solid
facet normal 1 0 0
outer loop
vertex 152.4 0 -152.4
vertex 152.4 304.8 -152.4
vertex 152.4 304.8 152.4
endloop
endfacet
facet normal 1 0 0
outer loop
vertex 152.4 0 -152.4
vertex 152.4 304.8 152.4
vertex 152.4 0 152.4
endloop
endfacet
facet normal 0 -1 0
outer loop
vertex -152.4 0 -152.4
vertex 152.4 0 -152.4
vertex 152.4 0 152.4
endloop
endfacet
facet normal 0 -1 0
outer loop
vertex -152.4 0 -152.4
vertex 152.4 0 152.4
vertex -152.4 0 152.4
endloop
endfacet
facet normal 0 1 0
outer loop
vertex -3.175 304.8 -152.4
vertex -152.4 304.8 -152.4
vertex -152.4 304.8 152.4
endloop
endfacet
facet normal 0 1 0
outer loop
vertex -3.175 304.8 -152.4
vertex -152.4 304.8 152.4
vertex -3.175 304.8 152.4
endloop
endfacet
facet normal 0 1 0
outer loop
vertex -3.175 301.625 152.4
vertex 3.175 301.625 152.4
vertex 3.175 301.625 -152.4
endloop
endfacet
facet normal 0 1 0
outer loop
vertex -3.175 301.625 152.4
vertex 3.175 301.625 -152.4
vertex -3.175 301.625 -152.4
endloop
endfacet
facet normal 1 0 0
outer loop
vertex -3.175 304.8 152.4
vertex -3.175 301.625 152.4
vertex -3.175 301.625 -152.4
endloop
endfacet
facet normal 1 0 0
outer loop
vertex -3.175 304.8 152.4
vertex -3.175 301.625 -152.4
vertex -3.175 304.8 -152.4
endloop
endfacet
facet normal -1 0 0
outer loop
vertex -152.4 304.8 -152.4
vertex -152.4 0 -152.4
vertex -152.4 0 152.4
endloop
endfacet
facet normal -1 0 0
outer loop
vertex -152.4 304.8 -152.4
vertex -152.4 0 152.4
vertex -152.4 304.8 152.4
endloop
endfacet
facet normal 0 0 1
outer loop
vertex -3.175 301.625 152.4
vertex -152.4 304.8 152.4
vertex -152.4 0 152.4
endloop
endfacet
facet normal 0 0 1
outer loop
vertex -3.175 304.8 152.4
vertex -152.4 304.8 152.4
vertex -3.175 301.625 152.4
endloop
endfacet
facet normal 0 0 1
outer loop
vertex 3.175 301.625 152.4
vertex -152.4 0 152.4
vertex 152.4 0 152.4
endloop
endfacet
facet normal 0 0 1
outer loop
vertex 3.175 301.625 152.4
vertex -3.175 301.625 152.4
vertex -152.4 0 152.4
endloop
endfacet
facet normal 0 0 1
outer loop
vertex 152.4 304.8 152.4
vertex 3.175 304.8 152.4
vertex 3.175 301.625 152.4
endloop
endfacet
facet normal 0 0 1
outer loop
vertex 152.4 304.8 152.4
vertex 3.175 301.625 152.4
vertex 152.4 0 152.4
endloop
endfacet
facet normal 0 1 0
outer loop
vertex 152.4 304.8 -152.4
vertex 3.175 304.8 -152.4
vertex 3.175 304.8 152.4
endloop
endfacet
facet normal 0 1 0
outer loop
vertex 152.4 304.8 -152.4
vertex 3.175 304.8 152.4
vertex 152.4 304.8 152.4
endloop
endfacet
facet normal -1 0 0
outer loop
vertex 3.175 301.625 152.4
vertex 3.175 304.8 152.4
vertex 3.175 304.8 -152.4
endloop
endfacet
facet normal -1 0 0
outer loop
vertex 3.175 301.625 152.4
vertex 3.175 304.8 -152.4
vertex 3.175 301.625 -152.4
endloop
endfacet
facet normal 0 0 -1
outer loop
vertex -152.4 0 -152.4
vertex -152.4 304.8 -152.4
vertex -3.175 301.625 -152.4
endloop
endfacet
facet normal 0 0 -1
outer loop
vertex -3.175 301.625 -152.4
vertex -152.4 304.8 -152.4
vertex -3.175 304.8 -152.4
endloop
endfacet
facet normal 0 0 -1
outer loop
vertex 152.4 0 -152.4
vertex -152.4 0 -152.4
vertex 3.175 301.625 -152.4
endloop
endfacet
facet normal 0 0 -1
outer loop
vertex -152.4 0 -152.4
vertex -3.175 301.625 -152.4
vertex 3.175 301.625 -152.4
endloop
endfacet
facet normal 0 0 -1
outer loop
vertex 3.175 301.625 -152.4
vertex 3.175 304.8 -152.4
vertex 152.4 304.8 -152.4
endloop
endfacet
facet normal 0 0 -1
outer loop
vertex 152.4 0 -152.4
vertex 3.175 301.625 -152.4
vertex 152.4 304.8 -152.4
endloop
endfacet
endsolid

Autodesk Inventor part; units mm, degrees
ref_plane "YZ Plane" through (0, 0, 0) normal (1, 0, 0) x (0, 1, 0)
ref_plane "XZ Plane" through (0, 0, 0) normal (0, 1, 0) x (-1, 0, 0)
ref_plane "XY Plane" through (0, 0, 0) normal (0, 0, 1) x (1, 0, 0)
sketch "Sketch1" plane through (0, 0, 0) normal (0, 0, 1) x (1, 0, 0)
  line L0 (-152.4, 304.8) -> (152.4, 304.8)
  line L1 (152.4, 304.8) -> (152.4, 0)
  line L2 (152.4, 0) -> (-152.4, 0)
  line L3 (-152.4, 0) -> (-152.4, 304.8)
  point P0 (0, 0)
  point P1 (0, 0)
extrude "Extrusion1" add sketch "Sketch1" along normal mid plane 304.8
sketch "Sketch2" plane through (0, 0, 152.4) normal (0, 0, 1) x (1, 0, 0)
  line L0 (-152.4, 304.8) -> (152.4, 304.8) projected
  line L1 (-3.175, 304.8) -> (3.175, 304.8)
  line L2 (3.175, 304.8) -> (3.175, 301.625)
  line L3 (3.175, 301.625) -> (-3.175, 301.625)
  line L4 (-3.175, 301.625) -> (-3.175, 304.8)
  point P0 (0, 0)
  point P1 (0, 304.8)
  dimension "d4" = 3.175
  dimension "d5" = 6.35
extrude "Extrusion2" cut sketch "Sketch2" against normal through all
sketch "Sketch3" plane through (0, 0, 152.4) normal (0, 0, 1) x (1, 0, 0)
  line L0 (-152.4, 0) -> (-152.4, 304.8) projected
  line L1 (152.4, 0) -> (-152.4, 0) projected
  line L2 (-127, 25.4) -> (-50.8, 25.4)
  line L3 (-50.8, 25.4) -> (-50.8, 101.6)
  line L4 (-50.8, 101.6) -> (-127, 101.6)
  line L5 (-127, 101.6) -> (-127, 25.4)
  line L6 (-123.825, 98.425) -> (-53.975, 98.425)
  line L7 (-53.975, 98.425) -> (-53.975, 28.575)
  line L8 (-53.975, 28.575) -> (-123.825, 28.575)
  line L9 (-123.825, 28.575) -> (-123.825, 98.425)
  line L10 (-38.1, 25.4) -> (38.1, 25.4)
  line L11 (38.1, 25.4) -> (38.1, 101.6)
  line L12 (38.1, 101.6) -> (-38.1, 101.6)
  line L13 (-38.1, 101.6) -> (-38.1, 25.4)
  line L14 (-34.925, 98.425) -> (34.925, 98.425)
  line L15 (34.925, 98.425) -> (34.925, 28.575)
  line L16 (34.925, 28.575) -> (-34.925, 28.575)
  line L17 (-34.925, 28.575) -> (-34.925, 98.425)
  line L18 (-127, 114.3) -> (-50.8, 114.3)
  line L19 (-50.8, 114.3) -> (-50.8, 190.5)
  line L20 (-50.8, 190.5) -> (-127, 190.5)
  line L21 (-127, 190.5) -> (-127, 114.3)
  line L22 (-123.825, 187.325) -> (-53.975, 187.325)
  line L23 (-53.975, 187.325) -> (-53.975, 117.475)
  line L24 (-53.975, 117.475) -> (-123.825, 117.475)
  line L25 (-123.825, 117.475) -> (-123.825, 187.325)
  line L26 (-38.1, 114.3) -> (38.1, 114.3)
  line L27 (38.1, 114.3) -> (38.1, 190.5)
  line L28 (38.1, 190.5) -> (-38.1, 190.5)
  line L29 (-38.1, 190.5) -> (-38.1, 114.3)
  line L30 (-34.925, 187.325) -> (34.925, 187.325)
  line L31 (34.925, 187.325) -> (34.925, 117.475)
  line L32 (34.925, 117.475) -> (-34.925, 117.475)
  line L33 (-34.925, 117.475) -> (-34.925, 187.325)
  point P0 (0, 0)
  dimension "d8" = 76.2
  dimension "d9" = 25.4
  dimension "d10" = 25.4
  dimension "d11" = 3.175
  dimension "d14" = 88.9
  dimension "d17" = 88.9
split_face "Split1"
split_face "Split2"
split_face "Split3"
split_face "Split4"
split_face "Split5"
split_face "Split6"
split_face "Split7"
split_face "Split8"
sketch "Sketch4" plane through (-123.825, 98.425, 152.4) normal (0, 0, 1) x (1, 0, 0)
  line L0 (0, 0) -> (69.85, 0) projected
  line L1 (0, -69.85) -> (0, 0) projected
  line L2 (69.85, -69.85) -> (0, -69.85) projected
  line L3 (19.0891, -57.15) -> (50.7609, -57.15)
  line L4 (50.7609, -57.15) -> (50.7609, -50.8)
  line L5 (19.0891, -50.8) -> (19.0891, -57.15)
  line L6 (38.1, -50.8) -> (38.1, -34.697)
  line L7 (31.75, -34.697) -> (31.75, -50.8)
  line L8 (19.6575, -12.7) -> (16.6521, -18.8843)
  line L9 (16.6521, -18.8843) -> (20.9342, -18.8843)
  line L10 (20.9342, -18.8843) -> (17.3368, -26.287)
  line L11 (22.15, -12.7) -> (20.3175, -16.4708)
  line L12 (20.3175, -16.4708) -> (24.6183, -16.4708)
  line L13 (24.6183, -16.4708) -> (18.9446, -28.1459)
  line L14 (12.7, -12.7) -> (19.6575, -12.7)
  line L15 (22.15, -12.7) -> (57.15, -12.7)
  arc A0 (12.7, -12.7) -> (17.3368, -26.287) centre (34.925, -12.7) ccw
  arc A1 (18.9446, -28.1459) -> (31.75, -34.697) centre (34.925, -12.7) ccw
  arc A2 (38.1, -34.697) -> (57.15, -12.7) centre (34.925, -12.7) ccw
  line L16 (50.7609, -50.8) -> (38.1, -50.8)
  line L17 (31.75, -50.8) -> (19.0891, -50.8)
  point P0 (123.825, -98.425)
  point P1 (34.925, -50.8)
  point P2 (34.925, -29.1715)
  point P3 (34.925, 0)
  dimension "d20" = 12.7
  dimension "d21" = 6.35
  dimension "d22" = 6.35
  dimension "d24" = 12.7
split_face "Split9"
split_face "Split10"
sketch "Sketch5" plane through (-34.925, 98.425, 152.4) normal (0, 0, 1) x (1, 0, 0)
  line L0 (69.85, 0) -> (69.85, -69.85) projected
  line L1 (0, 0) -> (69.85, 0) projected
  line L2 (0, -69.85) -> (0, 0) projected
  line L3 (69.85, -69.85) -> (0, -69.85) projected
  line L4 (57.15, -12.7) -> (57.15, -57.15) construction
  line L5 (57.15, -57.15) -> (12.7, -57.15) construction
  line L6 (12.7, -57.15) -> (12.7, -12.7) construction
  line L7 (12.7, -12.7) -> (57.15, -12.7) construction
  line L8 (36.0188, -31.0952) -> (36.0188, -51.4628)
  line L9 (33.8312, -51.4628) -> (33.8312, -31.0952)
  arc A0 (24.6443, -51.4628) -> (36.0188, -51.4628) centre (30.3316, -51.4628) ccw
  arc A1 (26.8319, -51.4628) -> (33.8312, -51.4628) centre (30.3316, -51.4628) ccw
  line L10 (24.6443, -51.4628) -> (26.8319, -51.4628)
  line L11 (36.0188, -13.8321) -> (36.0188, -12.7)
  line L12 (36.0188, -12.7) -> (33.8312, -12.7)
  line L13 (33.8312, -12.7) -> (33.8312, -13.8301)
  arc A2 (23.1675, -30.5813) -> (12.7, -30.0146) centre (17.5638, -37.131) ccw
  arc A3 (33.8312, -30.1527) -> (23.1675, -30.5813) centre (28.7712, -37.131) ccw
  arc A4 (46.5876, -30.5012) -> (36.0188, -30.1527) centre (41.0788, -37.131) ccw
  arc A5 (57.15, -30.1481) -> (46.5876, -30.5012) centre (52.0963, -37.131) ccw
  line L14 (36.0188, -31.0952) -> (36.0188, -30.1527)
  line L15 (33.8312, -31.0952) -> (33.8312, -30.1527)
  arc A6 (57.15, -30.1481) -> (36.0188, -13.8321) centre (34.9039, -37.1178) ccw
  arc A7 (33.8312, -13.8301) -> (12.7, -30.0146) centre (34.9039, -37.1178) ccw
  point P0 (34.925, -98.425)
  point P1 (34.925, -31.0952)
  point P2 (34.925, -31.0952)
  point P3 (34.925, -12.7)
  dimension "d25" = 12.7
split_face "Split11"
sketch "Sketch6" plane through (-34.925, 187.325, 152.4) normal (0, 0, 1) x (1, 0, 0)
  line L0 (69.85, 0) -> (69.85, -69.85) projected
  line L1 (0, 0) -> (69.85, 0) projected
  line L2 (0, -69.85) -> (0, 0) projected
  line L3 (69.85, -69.85) -> (0, -69.85) projected
  line L4 (57.15, -12.7) -> (57.15, -57.15) construction
  line L5 (57.15, -57.15) -> (12.7, -57.15)
  line L6 (12.7, -57.15) -> (12.7, -12.7) construction
  line L7 (12.7, -12.7) -> (57.15, -12.7) construction
  line L8 (12.7, -50.8) -> (57.15, -50.8)
  line L9 (22.6976, -12.7) -> (17.5193, -23.9944)
  line L10 (27.8758, -23.9944) -> (22.6976, -12.7)
  line L11 (25.8726, -23.9944) -> (25.8726, -48.0363)
  line L12 (25.8726, -48.0363) -> (19.5226, -48.0363)
  line L13 (19.5226, -48.0363) -> (19.5226, -23.9944)
  line L14 (34.925, -12.7) -> (34.925, -7.7199) construction
  line L15 (47.1524, -12.7) -> (52.3307, -23.9944)
  line L16 (41.9742, -23.9944) -> (47.1524, -12.7)
  line L17 (43.9774, -23.9944) -> (43.9774, -48.0363)
  line L18 (43.9774, -48.0363) -> (50.3274, -48.0363)
  line L19 (50.3274, -48.0363) -> (50.3274, -23.9944)
  line L20 (12.7, -50.8) -> (12.7, -57.15)
  line L21 (57.15, -50.8) -> (57.15, -57.15)
  line L22 (17.5193, -23.9944) -> (19.5226, -23.9944)
  line L23 (25.8726, -23.9944) -> (27.8758, -23.9944)
  line L24 (52.3307, -23.9944) -> (50.3274, -23.9944)
  line L25 (43.9774, -23.9944) -> (41.9742, -23.9944)
  point P0 (34.925, -187.325)
  point P1 (22.6976, -23.9944)
  point P2 (47.1524, -23.9944)
  dimension "d26" = 12.7
  dimension "d27" = 6.35
  dimension "d28" = 6.35
split_face "Split12"
split_face "Split13"
split_face "Split14"
sketch "Sketch7" plane through (-123.825, 187.325, 152.4) normal (0, 0, 1) x (1, 0, 0)
  line L0 (0, -69.85) -> (69.85, -69.85) projected
  line L1 (12.7, -12.7) -> (57.15, -12.7) construction
  line L2 (57.15, -57.15) -> (12.7, -57.15) construction
  line L3 (22.6688, -57.15) -> (22.6688, -52.8524)
  arc A0 (22.6688, -52.8524) -> (20.3647, -47.1054) centre (14.3497, -52.8524) ccw
  line L4 (20.3647, -47.1054) -> (15.1508, -41.6484)
  arc A1 (12.7, -34.925) -> (15.1508, -41.6484) centre (21.5956, -35.4908) ccw
  line L5 (15.875, -19.6032) -> (15.875, -31.6397)
  line L6 (17.6337, -36.0264) -> (26.3364, -45.1349)
  arc A2 (26.3364, -45.1349) -> (28.0331, -43.5138) centre (27.1847, -44.3243) ccw
  line L7 (28.0331, -43.5138) -> (21.521, -36.698)
  arc A3 (23.8166, -34.5047) -> (21.521, -36.698) centre (22.6688, -35.6013) ccw
  line L8 (23.8166, -34.5047) -> (30.3287, -41.3205)
  arc A4 (31.533, -44.3243) -> (30.3287, -41.3205) centre (27.1847, -44.3243) ccw
  line L9 (31.533, -44.3243) -> (31.533, -57.15)
  line L10 (34.925, -12.7) -> (34.925, -57.15) construction
  arc A5 (15.875, -19.6032) -> (12.7, -19.6032) centre (14.2875, -19.6032) ccw
  arc A6 (15.875, -31.6397) -> (17.6337, -36.0264) centre (22.225, -31.6397) ccw
  line L11 (12.7, -34.925) -> (12.7, -19.6032)
  line L12 (47.1812, -57.15) -> (47.1812, -52.8524)
  arc A7 (49.4853, -47.1054) -> (47.1812, -52.8524) centre (55.5003, -52.8524) ccw
  line L13 (49.4853, -47.1054) -> (54.6992, -41.6484)
  arc A8 (54.6992, -41.6484) -> (57.15, -34.925) centre (48.2544, -35.4908) ccw
  line L14 (53.975, -19.6032) -> (53.975, -31.6397)
  line L15 (52.2163, -36.0264) -> (43.5136, -45.1349)
  arc A9 (41.8169, -43.5138) -> (43.5136, -45.1349) centre (42.6653, -44.3243) ccw
  line L16 (41.8169, -43.5138) -> (48.329, -36.698)
  arc A10 (48.329, -36.698) -> (46.0334, -34.5047) centre (47.1812, -35.6013) ccw
  line L17 (46.0334, -34.5047) -> (39.5213, -41.3205)
  arc A11 (39.5213, -41.3205) -> (38.317, -44.3243) centre (42.6653, -44.3243) ccw
  line L18 (38.317, -44.3243) -> (38.317, -57.15)
  arc A12 (57.15, -19.6032) -> (53.975, -19.6032) centre (55.5625, -19.6032) ccw
  arc A13 (52.2163, -36.0264) -> (53.975, -31.6397) centre (47.625, -31.6397) ccw
  line L19 (38.317, -57.15) -> (47.1812, -57.15)
  line L20 (57.15, -19.6032) -> (57.15, -34.925)
  line L21 (34.925, -12.7) -> (26.384, -18.361)
  line L22 (26.384, -18.361) -> (34.925, -24.0221)
  line L23 (34.925, -24.0221) -> (43.466, -18.361)
  line L24 (43.466, -18.361) -> (34.925, -12.7)
  line L25 (26.5258, -20.3104) -> (33.8787, -25.1839)
  line L26 (33.8787, -25.1839) -> (33.8787, -33.5217)
  line L27 (33.8787, -33.5217) -> (26.5258, -28.6482)
  line L28 (26.5258, -28.6482) -> (26.5258, -20.3104)
  line L29 (43.3242, -20.3104) -> (35.9713, -25.1839)
  line L30 (35.9713, -25.1839) -> (35.9713, -33.5217)
  line L31 (35.9713, -33.5217) -> (43.3242, -28.6482)
  line L32 (43.3242, -28.6482) -> (43.3242, -20.3104)
  line L33 (22.6688, -57.15) -> (31.533, -57.15)
  line L34 (57.15, -12.7) -> (57.15, -34.925) construction
  line L35 (57.15, -36.0566) -> (57.15, -57.15) construction
  line L36 (12.7, -57.15) -> (12.7, -36.0566) construction
  line L37 (12.7, -34.925) -> (12.7, -12.7) construction
  point P0 (123.825, -187.325)
  dimension "d30" = 12.7
  dimension "d32" = 3.175
  dimension "d33" = 6.35
split_face "Split15"
split_face "Split16"
split_face "Split17"
split_face "Split18"
split_face "Split19"
sketch "Sketch8" plane through (-152.4, 304.8, -152.4) normal (0, 1, 0) x (1, 0, 0)
  line L0 (149.225, -304.8) -> (149.225, 0) projected
  line L1 (149.225, 0) -> (0, 0) projected
  line L2 (0, 0) -> (0, -304.8) projected
  line L3 (0, -304.8) -> (149.225, -304.8) projected
  line L4 (0, 0) -> (304.8, -304.8)
  point P0 (152.4, -152.4)
sketch "Sketch9" plane through (0, 0, -152.4) normal (0, 0, -1) x (-1, 0, 0)
  line L0 (-3.175, 301.625) -> (-3.175, 304.8) projected
  line L1 (-152.4, 304.8) -> (-3.175, 304.8) projected
  line L2 (-152.4, 0) -> (-152.4, 304.8) projected
  line L3 (152.4, 0) -> (-152.4, 0) projected
  line L4 (152.4, 304.8) -> (152.4, 0) projected
  line L5 (3.175, 304.8) -> (152.4, 304.8) projected
  line L6 (3.175, 304.8) -> (3.175, 301.625) projected
  line L7 (3.175, 301.625) -> (-3.175, 301.625) projected
  line L8 (152.4, 304.8) -> (-152.4, 0)
  point P0 (0, 0)
  point P1 (0, 152.4)
sketch "Sketch10" plane through (-152.4, 0, 152.4) normal (0, 0, 1) x (1, 0, 0)
  line L0 (101.6, 25.4) -> (101.6, 101.6) projected
  line L1 (25.4, 25.4) -> (101.6, 25.4) projected
  line L2 (25.4, 101.6) -> (25.4, 25.4) projected
  line L3 (101.6, 101.6) -> (25.4, 101.6) projected
  line L4 (155.575, 304.8) -> (155.575, 301.625) projected
  line L5 (155.575, 301.625) -> (149.225, 301.625) projected
  line L6 (149.225, 301.625) -> (149.225, 304.8) projected
  line L7 (0, 304.8) -> (149.225, 304.8) projected
  line L8 (0, 0) -> (0, 304.8) projected
  line L9 (304.8, 0) -> (0, 0) projected
  line L10 (304.8, 304.8) -> (304.8, 0) projected
  line L11 (155.575, 304.8) -> (304.8, 304.8) projected
  line L12 (101.6, 190.5) -> (101.6, 114.3) projected
  line L13 (101.6, 114.3) -> (25.4, 114.3) projected
  line L14 (25.4, 114.3) -> (25.4, 190.5) projected
  line L15 (25.4, 190.5) -> (101.6, 190.5) projected
  line L16 (190.5, 114.3) -> (190.5, 190.5) projected
  line L17 (114.3, 114.3) -> (190.5, 114.3) projected
  line L18 (114.3, 190.5) -> (114.3, 114.3) projected
  line L19 (190.5, 190.5) -> (114.3, 190.5) projected
  line L20 (190.5, 25.4) -> (190.5, 101.6) projected
  line L21 (114.3, 25.4) -> (190.5, 25.4) projected
  line L22 (114.3, 101.6) -> (114.3, 25.4) projected
  line L23 (190.5, 101.6) -> (114.3, 101.6) projected
  line L24 (0, 304.8) -> (304.8, 0)
  point P0 (152.4, 0)
  point P1 (152.4, 152.4)
equation "\"d28\" = d27"
equation "\"d32\" = d31"
equation "\"d31\" = 3.175"
properties part number "Box - Package"
